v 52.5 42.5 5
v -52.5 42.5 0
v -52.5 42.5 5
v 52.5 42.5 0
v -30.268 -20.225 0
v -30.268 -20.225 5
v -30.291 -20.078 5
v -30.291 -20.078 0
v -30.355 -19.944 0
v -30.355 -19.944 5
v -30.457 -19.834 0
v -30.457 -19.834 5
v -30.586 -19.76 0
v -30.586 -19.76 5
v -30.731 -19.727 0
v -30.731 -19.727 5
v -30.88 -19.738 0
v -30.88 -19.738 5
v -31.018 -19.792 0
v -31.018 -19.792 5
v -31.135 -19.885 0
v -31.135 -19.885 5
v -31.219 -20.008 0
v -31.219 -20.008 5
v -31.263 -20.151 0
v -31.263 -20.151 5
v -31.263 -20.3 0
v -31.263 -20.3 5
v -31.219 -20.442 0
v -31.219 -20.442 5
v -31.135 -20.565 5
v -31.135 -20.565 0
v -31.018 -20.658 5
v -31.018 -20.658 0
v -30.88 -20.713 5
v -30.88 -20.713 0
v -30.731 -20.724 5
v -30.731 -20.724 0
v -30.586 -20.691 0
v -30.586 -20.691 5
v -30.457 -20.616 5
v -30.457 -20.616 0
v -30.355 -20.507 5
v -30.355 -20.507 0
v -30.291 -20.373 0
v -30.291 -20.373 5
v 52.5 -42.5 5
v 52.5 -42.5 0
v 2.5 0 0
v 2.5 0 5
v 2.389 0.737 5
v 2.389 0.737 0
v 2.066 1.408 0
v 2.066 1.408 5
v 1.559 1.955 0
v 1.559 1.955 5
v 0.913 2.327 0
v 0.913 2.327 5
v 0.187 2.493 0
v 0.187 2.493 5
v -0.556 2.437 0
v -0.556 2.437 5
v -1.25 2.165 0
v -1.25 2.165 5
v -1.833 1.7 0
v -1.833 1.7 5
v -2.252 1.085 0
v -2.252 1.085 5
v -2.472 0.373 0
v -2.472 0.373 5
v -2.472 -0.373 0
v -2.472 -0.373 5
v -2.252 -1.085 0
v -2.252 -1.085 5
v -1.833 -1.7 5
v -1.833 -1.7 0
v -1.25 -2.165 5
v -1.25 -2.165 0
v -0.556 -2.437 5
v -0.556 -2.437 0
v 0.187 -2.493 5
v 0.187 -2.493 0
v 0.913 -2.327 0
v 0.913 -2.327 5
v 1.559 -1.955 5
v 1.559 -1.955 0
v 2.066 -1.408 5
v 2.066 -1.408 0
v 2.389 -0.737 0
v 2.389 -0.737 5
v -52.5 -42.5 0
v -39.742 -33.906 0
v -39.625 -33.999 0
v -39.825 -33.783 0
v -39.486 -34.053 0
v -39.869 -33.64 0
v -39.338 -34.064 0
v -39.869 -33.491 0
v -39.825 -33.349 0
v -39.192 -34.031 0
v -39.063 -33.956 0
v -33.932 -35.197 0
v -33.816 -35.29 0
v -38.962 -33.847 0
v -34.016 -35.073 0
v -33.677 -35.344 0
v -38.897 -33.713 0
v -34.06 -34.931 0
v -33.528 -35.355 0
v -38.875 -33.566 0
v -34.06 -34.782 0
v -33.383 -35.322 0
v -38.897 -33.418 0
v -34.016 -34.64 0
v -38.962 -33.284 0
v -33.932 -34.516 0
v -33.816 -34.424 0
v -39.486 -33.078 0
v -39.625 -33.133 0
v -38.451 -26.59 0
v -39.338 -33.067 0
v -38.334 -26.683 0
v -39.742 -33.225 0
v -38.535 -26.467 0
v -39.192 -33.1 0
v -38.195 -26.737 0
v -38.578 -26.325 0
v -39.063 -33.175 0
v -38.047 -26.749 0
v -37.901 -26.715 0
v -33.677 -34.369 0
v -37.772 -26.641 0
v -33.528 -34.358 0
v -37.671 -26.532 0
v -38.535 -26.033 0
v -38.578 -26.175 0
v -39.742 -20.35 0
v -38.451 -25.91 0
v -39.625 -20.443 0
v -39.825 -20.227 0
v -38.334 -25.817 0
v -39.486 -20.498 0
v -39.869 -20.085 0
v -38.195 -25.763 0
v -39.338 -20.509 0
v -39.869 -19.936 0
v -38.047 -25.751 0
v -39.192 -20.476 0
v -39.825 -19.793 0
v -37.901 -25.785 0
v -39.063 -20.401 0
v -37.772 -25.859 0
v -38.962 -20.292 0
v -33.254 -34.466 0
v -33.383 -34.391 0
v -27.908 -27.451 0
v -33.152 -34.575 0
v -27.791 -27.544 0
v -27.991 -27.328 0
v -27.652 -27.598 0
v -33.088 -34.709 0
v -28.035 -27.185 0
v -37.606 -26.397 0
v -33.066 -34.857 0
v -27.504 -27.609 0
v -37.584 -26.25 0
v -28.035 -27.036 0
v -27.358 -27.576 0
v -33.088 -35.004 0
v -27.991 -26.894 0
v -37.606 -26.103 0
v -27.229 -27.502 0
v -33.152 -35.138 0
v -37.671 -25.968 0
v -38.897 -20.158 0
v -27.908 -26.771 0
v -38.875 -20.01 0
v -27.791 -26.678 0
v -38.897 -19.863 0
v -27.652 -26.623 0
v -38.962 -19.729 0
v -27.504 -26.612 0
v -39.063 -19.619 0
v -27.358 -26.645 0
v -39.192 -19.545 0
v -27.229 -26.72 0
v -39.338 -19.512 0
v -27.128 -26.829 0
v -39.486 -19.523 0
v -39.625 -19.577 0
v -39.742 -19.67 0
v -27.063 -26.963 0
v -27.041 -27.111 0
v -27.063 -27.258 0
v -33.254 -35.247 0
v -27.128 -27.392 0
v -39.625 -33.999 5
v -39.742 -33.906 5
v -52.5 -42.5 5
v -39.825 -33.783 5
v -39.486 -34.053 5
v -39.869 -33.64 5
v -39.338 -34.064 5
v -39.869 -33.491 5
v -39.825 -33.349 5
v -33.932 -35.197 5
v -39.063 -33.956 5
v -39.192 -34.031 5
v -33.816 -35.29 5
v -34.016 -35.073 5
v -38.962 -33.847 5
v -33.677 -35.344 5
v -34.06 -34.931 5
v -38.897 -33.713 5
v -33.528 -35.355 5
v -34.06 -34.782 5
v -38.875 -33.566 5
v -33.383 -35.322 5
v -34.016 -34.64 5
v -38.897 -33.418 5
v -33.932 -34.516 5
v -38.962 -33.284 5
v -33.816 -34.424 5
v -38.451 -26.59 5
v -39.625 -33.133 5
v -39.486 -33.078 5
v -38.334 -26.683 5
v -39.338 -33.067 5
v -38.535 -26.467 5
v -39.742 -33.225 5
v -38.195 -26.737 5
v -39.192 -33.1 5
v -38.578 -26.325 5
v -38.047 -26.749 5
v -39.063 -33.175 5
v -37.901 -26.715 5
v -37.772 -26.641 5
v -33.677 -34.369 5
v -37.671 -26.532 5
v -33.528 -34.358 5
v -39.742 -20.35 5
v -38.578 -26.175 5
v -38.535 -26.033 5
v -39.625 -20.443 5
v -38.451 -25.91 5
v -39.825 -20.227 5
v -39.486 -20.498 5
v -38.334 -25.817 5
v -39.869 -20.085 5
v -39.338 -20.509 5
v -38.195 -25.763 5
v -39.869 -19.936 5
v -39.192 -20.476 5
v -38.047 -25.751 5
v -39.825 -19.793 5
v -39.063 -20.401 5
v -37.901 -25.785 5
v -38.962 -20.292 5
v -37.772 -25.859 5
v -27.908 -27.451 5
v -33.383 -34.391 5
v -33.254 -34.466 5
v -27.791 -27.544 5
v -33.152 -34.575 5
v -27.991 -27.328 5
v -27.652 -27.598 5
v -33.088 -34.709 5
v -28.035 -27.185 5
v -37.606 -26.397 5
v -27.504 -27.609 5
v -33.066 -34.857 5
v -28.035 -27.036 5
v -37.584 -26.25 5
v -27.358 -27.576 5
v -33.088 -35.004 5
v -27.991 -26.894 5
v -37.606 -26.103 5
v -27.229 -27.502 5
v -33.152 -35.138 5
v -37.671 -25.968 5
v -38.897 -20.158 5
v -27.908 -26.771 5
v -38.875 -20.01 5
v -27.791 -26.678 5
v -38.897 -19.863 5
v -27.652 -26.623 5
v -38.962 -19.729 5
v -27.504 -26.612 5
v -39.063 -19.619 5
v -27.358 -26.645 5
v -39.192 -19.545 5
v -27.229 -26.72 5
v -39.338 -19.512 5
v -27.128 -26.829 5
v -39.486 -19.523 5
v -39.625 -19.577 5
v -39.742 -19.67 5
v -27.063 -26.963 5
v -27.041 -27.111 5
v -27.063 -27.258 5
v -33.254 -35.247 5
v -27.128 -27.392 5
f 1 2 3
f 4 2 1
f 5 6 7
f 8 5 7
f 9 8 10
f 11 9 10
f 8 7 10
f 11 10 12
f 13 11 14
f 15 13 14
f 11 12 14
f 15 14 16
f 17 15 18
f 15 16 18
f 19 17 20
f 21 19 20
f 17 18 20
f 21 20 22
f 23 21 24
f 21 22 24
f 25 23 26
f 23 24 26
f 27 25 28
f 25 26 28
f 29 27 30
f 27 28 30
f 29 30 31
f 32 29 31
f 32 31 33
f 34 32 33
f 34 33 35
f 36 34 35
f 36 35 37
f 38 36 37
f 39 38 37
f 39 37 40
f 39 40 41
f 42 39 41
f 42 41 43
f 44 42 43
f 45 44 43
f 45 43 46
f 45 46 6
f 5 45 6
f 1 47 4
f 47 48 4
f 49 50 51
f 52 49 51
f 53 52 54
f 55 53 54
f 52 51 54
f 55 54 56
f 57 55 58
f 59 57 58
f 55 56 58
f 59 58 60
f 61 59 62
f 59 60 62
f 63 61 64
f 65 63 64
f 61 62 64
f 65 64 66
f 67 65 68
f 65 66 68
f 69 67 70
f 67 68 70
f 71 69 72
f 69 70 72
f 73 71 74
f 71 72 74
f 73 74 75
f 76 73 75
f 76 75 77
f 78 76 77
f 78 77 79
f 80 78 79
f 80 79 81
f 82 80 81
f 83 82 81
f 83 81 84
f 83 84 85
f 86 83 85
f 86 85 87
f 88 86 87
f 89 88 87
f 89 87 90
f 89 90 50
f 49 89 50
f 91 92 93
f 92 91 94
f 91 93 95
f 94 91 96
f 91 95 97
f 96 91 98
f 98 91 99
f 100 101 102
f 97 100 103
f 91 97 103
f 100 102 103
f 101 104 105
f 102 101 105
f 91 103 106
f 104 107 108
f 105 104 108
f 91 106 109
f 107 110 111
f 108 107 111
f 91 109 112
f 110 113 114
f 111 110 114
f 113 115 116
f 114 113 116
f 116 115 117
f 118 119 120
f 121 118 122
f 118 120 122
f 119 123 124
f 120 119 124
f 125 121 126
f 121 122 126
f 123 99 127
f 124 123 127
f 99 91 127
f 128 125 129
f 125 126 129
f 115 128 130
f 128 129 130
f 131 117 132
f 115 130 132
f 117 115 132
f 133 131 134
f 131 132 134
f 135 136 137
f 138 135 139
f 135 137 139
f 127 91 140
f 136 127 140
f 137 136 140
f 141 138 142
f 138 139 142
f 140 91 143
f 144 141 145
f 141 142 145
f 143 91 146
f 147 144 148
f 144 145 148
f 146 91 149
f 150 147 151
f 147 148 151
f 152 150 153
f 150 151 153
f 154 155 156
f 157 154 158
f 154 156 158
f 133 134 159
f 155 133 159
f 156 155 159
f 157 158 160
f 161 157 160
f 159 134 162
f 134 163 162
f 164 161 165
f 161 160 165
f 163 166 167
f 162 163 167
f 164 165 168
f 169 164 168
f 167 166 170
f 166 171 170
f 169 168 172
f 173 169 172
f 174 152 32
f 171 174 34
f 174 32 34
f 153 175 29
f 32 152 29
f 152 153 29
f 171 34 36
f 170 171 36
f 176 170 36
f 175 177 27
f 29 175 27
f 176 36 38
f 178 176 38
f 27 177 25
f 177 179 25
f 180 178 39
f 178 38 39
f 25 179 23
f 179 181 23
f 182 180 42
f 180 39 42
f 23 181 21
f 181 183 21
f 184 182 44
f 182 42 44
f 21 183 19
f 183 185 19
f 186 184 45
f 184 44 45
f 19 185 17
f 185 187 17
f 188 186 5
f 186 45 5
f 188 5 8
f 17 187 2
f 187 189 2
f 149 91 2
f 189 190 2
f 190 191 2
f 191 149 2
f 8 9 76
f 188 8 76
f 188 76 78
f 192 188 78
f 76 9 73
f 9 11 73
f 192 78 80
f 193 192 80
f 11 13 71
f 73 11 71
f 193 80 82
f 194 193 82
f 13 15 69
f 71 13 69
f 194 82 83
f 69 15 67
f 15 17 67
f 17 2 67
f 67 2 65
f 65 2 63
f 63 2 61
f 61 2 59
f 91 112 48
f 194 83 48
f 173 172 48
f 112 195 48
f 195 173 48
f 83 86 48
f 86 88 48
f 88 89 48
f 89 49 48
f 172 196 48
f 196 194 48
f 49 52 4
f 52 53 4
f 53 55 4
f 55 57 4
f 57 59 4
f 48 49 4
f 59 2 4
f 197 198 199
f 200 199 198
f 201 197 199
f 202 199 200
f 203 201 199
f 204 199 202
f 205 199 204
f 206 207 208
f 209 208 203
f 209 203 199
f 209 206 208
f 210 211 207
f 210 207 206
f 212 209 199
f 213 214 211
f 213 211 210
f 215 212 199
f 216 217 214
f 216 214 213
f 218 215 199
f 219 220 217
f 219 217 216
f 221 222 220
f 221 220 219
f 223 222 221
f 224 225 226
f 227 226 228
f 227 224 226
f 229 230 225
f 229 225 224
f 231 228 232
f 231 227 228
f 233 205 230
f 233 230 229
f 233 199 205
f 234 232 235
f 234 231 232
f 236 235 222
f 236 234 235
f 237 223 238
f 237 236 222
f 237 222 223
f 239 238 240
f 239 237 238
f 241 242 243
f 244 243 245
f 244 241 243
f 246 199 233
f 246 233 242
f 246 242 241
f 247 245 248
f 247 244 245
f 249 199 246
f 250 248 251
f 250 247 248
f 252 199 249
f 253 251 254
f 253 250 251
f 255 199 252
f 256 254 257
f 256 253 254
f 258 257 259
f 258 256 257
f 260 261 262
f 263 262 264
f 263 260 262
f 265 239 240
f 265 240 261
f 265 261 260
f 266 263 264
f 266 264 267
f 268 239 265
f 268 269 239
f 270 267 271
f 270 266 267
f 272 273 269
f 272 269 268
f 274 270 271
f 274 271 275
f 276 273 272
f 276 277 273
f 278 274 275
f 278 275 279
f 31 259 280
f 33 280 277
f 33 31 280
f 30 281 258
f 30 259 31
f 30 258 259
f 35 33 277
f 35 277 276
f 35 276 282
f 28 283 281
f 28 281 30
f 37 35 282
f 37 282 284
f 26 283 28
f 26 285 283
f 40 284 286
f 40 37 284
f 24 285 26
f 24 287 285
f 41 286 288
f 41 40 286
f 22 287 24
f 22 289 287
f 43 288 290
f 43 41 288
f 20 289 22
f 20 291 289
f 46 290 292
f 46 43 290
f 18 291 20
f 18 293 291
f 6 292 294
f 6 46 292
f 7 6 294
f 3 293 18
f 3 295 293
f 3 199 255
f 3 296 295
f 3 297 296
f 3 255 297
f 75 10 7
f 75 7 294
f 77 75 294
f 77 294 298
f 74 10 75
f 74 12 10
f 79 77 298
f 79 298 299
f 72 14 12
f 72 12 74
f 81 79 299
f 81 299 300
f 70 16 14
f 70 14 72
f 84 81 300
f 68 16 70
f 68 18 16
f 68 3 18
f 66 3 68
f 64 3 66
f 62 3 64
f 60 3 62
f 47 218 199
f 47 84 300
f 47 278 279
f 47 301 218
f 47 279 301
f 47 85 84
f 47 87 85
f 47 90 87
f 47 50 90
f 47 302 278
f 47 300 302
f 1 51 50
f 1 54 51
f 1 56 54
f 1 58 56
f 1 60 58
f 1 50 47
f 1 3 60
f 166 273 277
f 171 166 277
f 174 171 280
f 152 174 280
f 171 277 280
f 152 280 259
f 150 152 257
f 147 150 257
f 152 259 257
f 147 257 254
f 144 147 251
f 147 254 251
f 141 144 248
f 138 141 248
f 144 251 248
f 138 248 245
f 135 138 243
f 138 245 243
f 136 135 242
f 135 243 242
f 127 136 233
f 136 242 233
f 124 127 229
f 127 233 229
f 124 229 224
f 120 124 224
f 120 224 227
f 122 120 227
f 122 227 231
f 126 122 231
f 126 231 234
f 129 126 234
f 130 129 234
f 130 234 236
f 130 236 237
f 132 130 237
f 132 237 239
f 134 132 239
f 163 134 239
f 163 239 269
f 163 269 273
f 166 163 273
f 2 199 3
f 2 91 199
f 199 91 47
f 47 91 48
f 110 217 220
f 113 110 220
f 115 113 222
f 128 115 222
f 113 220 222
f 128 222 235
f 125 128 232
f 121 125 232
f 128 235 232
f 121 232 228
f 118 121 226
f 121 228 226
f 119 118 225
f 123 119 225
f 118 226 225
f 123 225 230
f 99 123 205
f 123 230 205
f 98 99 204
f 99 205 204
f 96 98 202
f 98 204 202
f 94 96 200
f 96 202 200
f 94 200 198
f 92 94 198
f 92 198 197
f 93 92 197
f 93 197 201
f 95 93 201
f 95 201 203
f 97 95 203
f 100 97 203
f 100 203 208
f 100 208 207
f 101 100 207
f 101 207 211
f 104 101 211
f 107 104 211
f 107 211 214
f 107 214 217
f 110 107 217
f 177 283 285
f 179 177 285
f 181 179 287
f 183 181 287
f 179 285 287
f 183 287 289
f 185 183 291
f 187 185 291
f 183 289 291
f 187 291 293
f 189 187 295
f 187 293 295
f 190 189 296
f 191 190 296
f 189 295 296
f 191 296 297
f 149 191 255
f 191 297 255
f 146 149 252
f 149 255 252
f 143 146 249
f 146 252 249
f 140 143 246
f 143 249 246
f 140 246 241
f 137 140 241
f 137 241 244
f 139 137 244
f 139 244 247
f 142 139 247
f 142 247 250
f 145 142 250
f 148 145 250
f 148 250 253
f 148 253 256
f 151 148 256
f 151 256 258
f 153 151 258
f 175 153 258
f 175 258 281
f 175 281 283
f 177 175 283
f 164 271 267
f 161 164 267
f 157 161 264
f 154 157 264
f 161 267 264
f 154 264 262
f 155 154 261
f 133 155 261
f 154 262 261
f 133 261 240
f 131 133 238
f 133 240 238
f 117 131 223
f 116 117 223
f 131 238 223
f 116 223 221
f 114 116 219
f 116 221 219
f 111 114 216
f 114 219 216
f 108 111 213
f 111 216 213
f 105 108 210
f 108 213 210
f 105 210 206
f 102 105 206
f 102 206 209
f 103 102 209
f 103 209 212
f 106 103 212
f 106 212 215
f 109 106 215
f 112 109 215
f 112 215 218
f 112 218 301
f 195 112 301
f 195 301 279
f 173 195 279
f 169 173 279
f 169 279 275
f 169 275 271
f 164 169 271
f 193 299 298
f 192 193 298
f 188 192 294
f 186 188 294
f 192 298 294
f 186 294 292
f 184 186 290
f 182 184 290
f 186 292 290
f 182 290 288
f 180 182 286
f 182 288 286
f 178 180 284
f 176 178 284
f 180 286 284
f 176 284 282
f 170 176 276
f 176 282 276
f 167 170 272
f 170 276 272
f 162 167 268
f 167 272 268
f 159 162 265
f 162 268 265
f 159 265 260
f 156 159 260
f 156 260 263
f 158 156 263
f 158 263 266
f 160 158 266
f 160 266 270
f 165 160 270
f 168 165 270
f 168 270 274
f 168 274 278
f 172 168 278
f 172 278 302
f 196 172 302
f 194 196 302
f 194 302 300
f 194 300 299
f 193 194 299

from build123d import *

# Parameters (mm, degrees)
F0_W      = 105
F0_H      = 85
F1_DEPTH  = 2.5
F1_FACE_W = 105
F1_FACE_H = 85
F2_DEPTH  = 2.5
F3_R      = 2.5
F3_R_2    = 0.5
F4_DEPTH  = 25


with BuildPart() as f1:
    # F0 (on Top) → F1 (new body)
    with BuildSketch(Plane.XY):
        Rectangle(F0_W, F0_H)
    extrude(amount=F1_DEPTH)

    # F1_face (on face) → F2 (join)
    with BuildSketch(Plane.XY.offset(2.5)):
        Rectangle(F1_FACE_W, F1_FACE_H)
    extrude(amount=F2_DEPTH)

    # F3 (on face) → F4 (cut)
    with BuildSketch(Plane.XY.offset(5)):
        Circle(F3_R)
        with Locations((-38.084019, -26.250001)):
            Circle(F3_R_2)
        with Locations((-27.540985, -27.110657)):
            Circle(F3_R_2)
        with Locations((-30.768445, -20.225411)):
            Circle(F3_R_2)
        with Locations((-39.375, -20.010246)):
            Circle(F3_R_2)
        with Locations((-33.565577, -34.856558)):
            Circle(F3_R_2)
        with Locations((-39.375, -33.565573)):
            Circle(F3_R_2)
    extrude(amount=-F4_DEPTH, mode=Mode.SUBTRACT)


solid = f1.part
